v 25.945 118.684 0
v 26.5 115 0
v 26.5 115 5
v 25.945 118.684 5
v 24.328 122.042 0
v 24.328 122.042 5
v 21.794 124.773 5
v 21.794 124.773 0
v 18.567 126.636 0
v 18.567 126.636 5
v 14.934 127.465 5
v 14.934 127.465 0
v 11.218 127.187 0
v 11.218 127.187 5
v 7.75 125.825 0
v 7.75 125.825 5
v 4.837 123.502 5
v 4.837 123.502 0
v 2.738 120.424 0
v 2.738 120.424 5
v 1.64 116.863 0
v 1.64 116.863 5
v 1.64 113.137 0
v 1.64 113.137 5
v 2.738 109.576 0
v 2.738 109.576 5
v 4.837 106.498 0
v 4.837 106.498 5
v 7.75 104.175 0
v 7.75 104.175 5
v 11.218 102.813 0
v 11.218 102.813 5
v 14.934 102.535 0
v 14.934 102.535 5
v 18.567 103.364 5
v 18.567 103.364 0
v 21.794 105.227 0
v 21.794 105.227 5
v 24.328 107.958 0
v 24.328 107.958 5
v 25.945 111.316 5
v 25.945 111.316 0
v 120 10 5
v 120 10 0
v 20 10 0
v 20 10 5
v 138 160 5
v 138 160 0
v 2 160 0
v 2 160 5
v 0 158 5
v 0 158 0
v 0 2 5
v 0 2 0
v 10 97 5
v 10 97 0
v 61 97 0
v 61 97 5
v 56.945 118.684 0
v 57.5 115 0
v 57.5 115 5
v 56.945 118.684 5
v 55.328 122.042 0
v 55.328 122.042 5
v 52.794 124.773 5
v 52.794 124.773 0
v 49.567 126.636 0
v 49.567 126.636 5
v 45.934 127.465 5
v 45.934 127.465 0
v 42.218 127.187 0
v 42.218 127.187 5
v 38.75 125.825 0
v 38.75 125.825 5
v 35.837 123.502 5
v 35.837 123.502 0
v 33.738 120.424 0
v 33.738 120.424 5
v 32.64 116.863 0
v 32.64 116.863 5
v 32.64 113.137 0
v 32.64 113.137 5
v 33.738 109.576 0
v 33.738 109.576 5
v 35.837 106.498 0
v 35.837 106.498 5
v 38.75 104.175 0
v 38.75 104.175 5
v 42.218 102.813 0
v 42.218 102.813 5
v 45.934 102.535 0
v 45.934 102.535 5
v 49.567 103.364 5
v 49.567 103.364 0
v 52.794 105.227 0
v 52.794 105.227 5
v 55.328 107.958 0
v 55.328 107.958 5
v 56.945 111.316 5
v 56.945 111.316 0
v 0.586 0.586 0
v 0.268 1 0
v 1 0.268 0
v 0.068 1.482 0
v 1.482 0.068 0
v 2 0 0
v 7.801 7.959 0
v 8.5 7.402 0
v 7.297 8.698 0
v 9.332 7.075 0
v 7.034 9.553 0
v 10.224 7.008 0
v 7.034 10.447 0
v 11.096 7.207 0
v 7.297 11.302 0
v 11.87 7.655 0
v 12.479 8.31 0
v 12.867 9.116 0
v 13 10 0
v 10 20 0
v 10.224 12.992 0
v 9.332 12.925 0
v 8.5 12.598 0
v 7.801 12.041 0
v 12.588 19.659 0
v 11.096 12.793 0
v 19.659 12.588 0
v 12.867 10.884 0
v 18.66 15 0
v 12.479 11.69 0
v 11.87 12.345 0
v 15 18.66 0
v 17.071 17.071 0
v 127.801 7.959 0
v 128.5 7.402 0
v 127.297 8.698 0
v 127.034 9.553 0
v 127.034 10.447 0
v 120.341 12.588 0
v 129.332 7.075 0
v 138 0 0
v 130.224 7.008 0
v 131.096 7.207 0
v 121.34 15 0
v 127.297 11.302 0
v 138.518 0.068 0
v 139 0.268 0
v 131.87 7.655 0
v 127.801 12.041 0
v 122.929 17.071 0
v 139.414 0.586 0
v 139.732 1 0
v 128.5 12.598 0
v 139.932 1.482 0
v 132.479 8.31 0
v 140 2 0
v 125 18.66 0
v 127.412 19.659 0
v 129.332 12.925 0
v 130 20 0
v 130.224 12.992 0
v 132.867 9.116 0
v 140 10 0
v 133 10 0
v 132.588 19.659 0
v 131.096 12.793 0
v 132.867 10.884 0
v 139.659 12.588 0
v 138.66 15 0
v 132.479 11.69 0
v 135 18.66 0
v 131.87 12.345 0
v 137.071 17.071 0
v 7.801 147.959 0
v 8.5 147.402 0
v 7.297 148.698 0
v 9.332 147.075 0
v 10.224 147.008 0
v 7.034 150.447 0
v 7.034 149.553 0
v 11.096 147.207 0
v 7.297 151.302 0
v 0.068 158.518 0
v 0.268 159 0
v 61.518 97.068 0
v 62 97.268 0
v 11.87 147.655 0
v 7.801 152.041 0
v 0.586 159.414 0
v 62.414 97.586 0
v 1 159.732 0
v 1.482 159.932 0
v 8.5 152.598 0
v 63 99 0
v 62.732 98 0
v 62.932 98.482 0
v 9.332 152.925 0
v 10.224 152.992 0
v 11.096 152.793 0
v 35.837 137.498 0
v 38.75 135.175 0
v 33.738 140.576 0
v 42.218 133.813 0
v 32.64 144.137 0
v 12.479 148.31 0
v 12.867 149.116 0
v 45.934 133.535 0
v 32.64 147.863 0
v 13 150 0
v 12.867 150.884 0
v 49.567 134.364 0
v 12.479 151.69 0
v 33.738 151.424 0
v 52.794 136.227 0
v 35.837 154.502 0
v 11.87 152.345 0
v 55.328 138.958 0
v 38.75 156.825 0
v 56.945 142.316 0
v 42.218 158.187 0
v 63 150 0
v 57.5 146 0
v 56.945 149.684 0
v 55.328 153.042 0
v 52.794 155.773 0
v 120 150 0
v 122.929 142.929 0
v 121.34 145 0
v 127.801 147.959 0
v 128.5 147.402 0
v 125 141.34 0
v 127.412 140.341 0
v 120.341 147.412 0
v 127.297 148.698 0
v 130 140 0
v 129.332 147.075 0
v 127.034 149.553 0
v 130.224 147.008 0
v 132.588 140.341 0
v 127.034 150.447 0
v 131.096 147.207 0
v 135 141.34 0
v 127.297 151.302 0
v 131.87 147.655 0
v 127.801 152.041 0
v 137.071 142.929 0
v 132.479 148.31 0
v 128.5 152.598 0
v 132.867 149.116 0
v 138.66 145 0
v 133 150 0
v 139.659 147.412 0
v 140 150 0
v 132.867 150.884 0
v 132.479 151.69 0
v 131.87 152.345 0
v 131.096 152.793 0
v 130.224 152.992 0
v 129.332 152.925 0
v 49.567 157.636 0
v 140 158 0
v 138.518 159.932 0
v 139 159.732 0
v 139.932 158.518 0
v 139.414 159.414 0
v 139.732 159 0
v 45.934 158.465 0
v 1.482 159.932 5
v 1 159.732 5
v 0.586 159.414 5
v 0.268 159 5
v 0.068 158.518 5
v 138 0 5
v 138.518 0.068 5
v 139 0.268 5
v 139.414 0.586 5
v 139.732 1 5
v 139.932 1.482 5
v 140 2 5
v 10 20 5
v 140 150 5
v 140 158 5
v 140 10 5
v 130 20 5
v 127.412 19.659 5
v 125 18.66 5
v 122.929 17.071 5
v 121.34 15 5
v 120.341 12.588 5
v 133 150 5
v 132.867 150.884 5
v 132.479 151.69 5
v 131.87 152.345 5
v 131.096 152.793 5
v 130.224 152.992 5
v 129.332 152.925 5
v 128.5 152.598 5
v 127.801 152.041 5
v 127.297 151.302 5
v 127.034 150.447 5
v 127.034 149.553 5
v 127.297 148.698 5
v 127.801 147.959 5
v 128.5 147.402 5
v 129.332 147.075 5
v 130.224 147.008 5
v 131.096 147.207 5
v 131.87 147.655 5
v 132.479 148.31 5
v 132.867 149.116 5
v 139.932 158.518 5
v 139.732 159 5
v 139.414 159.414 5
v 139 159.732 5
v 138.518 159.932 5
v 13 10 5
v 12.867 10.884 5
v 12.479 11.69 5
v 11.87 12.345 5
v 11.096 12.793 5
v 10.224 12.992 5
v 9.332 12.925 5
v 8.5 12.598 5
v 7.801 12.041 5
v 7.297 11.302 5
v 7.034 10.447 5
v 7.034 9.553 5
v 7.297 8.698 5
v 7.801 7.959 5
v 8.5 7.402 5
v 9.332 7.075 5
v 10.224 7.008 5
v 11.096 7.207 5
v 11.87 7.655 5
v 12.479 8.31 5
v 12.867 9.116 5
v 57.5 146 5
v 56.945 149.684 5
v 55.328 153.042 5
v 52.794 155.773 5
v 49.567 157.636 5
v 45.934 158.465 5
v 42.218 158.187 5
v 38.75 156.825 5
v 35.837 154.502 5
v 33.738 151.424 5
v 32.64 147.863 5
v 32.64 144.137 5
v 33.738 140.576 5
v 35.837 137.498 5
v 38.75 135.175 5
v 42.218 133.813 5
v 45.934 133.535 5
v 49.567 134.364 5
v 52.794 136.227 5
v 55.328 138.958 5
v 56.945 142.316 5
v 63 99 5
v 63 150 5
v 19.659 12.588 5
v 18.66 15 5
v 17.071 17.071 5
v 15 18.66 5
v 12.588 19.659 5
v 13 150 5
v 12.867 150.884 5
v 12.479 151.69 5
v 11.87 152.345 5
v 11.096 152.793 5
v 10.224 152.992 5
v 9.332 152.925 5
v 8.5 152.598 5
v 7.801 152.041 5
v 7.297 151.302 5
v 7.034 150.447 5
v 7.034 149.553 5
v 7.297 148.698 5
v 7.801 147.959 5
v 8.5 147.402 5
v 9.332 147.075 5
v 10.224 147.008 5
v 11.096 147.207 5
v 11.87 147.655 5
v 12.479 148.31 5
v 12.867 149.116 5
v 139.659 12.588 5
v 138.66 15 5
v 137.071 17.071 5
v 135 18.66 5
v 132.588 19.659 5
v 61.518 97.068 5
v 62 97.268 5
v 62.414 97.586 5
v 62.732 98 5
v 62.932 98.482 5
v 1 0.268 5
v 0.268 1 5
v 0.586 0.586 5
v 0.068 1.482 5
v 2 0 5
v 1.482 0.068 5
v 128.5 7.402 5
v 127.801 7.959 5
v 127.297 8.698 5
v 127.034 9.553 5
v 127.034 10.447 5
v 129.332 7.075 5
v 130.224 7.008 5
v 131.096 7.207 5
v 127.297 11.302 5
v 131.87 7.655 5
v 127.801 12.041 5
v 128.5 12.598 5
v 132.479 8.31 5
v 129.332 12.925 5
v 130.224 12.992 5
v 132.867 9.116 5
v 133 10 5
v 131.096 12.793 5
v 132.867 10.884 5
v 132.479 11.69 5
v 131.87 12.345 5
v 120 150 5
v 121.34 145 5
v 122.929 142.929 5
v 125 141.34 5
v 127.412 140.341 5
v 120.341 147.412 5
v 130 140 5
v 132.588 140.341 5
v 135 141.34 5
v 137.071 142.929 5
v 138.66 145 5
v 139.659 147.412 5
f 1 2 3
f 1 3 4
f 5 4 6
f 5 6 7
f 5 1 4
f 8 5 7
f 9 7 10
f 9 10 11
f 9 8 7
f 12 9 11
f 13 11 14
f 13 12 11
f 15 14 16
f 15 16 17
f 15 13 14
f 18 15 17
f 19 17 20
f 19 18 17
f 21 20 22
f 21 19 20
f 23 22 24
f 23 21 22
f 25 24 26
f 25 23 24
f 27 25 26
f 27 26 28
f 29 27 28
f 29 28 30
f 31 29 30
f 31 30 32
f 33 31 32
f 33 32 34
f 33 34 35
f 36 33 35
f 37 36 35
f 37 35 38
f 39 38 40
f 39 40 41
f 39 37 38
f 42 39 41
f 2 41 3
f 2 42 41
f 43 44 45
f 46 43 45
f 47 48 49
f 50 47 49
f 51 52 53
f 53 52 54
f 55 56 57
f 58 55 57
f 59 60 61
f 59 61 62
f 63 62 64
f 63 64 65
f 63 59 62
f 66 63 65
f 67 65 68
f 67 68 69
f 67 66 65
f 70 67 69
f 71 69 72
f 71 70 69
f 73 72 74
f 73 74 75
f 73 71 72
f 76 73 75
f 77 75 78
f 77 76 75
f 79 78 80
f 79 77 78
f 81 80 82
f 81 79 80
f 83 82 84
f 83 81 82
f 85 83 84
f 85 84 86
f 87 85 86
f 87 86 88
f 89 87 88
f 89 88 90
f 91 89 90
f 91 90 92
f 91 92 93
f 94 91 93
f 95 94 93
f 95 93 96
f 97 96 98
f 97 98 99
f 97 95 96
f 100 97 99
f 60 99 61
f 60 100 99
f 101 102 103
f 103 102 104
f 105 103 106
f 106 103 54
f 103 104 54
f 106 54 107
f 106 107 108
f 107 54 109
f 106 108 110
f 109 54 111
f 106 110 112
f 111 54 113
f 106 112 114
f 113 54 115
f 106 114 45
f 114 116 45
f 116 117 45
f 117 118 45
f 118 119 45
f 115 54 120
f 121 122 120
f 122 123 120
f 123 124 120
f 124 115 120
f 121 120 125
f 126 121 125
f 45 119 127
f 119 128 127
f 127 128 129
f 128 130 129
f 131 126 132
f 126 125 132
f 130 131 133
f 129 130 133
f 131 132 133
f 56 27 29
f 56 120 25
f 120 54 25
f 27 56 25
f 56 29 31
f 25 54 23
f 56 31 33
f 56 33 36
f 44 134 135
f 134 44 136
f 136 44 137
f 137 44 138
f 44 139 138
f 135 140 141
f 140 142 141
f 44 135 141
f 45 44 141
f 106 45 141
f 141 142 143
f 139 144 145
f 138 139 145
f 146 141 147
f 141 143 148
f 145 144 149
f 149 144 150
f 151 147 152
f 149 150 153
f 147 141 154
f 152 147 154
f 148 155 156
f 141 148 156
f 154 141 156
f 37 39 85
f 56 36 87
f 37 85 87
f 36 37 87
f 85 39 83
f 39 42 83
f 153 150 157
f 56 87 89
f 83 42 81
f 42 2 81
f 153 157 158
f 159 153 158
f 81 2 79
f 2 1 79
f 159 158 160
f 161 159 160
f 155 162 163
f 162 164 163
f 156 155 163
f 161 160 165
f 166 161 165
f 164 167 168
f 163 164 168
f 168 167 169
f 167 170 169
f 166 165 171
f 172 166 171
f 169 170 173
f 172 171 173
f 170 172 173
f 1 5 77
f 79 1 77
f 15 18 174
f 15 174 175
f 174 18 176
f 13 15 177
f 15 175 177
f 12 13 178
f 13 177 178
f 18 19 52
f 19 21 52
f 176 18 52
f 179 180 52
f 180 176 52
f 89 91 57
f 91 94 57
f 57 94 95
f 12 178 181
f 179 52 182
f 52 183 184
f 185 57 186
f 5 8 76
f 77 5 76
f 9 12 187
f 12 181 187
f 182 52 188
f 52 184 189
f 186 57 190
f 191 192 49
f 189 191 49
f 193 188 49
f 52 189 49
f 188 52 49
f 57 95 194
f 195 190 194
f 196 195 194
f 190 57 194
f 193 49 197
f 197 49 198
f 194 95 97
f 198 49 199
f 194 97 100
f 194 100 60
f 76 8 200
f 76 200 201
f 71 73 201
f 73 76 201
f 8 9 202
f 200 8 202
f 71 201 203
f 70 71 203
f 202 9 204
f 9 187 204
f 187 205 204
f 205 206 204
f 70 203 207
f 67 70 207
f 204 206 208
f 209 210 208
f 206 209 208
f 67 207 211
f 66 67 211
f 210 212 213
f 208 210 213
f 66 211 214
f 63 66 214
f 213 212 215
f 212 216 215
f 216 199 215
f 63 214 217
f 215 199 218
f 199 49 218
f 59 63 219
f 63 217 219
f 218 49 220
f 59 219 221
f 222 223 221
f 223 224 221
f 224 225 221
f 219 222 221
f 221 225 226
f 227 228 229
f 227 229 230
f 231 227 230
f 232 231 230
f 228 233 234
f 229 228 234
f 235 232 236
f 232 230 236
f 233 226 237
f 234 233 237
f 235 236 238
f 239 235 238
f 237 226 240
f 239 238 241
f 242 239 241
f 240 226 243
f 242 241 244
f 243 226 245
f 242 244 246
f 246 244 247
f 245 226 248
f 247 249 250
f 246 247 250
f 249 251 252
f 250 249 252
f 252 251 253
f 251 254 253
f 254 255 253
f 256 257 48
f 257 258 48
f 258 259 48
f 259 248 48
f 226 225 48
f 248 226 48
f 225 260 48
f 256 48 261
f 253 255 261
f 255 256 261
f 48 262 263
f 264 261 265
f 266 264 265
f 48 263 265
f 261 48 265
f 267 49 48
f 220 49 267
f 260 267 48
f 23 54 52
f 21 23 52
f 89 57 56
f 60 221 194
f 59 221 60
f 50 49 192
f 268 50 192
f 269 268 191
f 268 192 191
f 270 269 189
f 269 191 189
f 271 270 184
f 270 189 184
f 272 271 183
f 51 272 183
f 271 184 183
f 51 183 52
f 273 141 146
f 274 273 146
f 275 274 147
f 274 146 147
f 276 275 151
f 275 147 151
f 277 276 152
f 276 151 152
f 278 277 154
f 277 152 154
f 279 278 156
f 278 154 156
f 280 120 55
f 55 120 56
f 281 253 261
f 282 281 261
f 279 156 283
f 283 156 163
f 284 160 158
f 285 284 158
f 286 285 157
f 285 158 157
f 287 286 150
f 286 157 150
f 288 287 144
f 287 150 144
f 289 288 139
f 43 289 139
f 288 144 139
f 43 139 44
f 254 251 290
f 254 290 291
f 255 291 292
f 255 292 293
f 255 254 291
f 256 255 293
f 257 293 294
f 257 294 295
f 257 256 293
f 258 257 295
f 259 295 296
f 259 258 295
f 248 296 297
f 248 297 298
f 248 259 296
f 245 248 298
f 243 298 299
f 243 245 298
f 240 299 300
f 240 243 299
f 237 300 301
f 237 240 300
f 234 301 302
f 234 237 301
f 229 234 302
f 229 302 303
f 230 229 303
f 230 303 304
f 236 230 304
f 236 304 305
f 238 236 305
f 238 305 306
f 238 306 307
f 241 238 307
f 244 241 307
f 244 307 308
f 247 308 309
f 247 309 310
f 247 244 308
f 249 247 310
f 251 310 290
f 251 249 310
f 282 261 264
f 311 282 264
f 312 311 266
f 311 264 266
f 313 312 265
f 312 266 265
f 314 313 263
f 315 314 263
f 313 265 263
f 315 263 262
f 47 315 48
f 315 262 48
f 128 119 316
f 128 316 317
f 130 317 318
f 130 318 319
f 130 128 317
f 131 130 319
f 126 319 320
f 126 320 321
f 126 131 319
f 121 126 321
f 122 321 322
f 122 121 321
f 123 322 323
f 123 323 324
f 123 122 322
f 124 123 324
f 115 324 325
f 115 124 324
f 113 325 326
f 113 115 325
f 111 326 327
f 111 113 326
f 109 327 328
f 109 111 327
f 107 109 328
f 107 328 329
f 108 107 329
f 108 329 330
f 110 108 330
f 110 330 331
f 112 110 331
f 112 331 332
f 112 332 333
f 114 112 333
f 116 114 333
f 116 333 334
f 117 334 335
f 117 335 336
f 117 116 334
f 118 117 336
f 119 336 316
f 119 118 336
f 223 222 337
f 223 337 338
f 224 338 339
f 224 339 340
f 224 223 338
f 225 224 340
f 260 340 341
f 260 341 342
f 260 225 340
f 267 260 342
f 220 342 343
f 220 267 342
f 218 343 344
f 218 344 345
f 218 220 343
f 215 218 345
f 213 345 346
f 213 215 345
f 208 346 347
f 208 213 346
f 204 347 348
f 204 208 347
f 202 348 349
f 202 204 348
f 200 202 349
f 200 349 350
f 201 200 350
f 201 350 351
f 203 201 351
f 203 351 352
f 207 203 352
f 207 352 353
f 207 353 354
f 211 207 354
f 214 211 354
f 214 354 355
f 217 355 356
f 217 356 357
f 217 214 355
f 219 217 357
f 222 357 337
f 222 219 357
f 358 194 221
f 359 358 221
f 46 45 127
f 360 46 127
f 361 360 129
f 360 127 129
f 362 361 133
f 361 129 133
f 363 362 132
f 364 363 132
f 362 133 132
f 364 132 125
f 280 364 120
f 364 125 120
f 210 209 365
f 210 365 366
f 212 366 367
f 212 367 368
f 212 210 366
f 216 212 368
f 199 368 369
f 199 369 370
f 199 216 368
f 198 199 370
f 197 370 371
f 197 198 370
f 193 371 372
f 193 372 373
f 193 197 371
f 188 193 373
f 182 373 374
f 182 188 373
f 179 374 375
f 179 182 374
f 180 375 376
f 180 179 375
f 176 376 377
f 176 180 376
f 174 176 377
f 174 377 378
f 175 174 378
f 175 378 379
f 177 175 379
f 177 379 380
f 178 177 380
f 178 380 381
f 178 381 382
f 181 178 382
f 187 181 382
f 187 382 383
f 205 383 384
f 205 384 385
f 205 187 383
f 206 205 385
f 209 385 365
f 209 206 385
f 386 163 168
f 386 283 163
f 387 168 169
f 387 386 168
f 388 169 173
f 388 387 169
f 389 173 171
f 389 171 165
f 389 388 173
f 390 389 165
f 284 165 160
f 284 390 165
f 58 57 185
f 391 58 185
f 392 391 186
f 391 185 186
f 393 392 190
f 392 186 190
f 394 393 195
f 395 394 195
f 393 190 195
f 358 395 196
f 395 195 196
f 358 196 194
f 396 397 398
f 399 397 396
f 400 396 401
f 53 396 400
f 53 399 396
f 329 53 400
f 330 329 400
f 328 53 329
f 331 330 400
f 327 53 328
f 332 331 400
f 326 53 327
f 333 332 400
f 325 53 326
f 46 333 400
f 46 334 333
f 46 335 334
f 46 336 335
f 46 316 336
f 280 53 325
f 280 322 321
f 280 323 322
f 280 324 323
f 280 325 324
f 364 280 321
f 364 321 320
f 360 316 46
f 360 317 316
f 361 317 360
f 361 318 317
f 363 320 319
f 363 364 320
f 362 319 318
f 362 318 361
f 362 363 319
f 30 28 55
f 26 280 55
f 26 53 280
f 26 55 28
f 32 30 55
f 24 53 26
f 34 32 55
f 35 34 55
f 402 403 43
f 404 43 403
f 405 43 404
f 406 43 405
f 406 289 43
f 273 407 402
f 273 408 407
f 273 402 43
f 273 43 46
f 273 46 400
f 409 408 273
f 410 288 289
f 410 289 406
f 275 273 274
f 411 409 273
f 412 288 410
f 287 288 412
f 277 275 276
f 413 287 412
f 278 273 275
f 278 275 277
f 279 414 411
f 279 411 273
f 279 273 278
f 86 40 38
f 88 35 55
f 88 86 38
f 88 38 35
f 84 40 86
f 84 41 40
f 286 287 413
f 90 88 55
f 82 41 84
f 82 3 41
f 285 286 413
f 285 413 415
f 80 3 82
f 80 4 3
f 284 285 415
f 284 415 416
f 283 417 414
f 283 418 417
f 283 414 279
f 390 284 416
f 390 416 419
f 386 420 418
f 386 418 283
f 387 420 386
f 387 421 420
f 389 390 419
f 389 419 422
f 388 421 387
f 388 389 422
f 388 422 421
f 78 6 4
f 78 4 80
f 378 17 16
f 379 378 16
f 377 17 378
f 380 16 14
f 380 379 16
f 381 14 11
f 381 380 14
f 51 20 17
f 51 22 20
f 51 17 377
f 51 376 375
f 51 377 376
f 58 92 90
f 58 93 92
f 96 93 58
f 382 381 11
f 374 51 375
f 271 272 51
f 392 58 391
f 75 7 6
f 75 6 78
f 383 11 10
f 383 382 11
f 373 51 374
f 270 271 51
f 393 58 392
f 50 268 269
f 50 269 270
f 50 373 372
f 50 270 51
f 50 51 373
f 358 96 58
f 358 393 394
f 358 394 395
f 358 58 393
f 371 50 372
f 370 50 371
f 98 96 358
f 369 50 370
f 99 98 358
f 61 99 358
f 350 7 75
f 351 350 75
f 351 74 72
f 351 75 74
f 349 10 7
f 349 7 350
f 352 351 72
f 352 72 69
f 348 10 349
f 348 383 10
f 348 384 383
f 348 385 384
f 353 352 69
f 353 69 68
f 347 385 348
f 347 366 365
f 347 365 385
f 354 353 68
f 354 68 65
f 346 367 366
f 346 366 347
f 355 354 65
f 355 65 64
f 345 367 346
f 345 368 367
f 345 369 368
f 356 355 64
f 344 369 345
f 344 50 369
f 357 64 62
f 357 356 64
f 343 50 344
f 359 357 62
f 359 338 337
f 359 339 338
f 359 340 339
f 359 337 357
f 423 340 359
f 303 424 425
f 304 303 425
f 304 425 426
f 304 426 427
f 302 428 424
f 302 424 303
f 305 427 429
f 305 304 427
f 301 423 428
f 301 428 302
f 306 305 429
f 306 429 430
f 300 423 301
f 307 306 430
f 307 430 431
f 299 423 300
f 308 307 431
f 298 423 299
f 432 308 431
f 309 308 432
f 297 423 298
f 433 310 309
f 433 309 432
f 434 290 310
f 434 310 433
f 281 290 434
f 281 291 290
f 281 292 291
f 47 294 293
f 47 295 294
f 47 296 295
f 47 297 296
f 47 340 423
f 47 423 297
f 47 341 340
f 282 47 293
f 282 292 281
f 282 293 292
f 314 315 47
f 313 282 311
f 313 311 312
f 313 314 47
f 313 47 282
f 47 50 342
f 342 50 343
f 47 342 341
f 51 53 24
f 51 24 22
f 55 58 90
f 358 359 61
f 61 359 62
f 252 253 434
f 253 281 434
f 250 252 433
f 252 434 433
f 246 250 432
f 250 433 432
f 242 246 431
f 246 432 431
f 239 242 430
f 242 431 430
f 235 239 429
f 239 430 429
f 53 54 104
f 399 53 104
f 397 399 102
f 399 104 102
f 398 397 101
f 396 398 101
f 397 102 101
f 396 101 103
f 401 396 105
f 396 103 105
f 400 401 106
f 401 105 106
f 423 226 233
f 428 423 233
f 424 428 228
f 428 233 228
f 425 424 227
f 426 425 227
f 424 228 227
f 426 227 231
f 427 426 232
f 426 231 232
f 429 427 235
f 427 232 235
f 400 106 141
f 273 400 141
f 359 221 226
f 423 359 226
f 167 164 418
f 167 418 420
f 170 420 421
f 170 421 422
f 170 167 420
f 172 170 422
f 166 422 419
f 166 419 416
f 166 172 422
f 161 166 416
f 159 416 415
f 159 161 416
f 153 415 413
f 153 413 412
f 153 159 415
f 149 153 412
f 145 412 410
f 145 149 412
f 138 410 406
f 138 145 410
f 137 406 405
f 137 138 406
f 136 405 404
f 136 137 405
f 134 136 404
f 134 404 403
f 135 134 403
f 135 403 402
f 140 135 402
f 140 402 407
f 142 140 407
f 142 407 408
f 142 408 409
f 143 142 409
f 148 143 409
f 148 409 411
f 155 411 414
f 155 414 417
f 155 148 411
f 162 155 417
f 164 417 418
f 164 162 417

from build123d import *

# Parameters (mm, degrees)
MODEL_R             = 12.5
MODEL_R_2           = 3
BOSS_EXTRUDE2_DEPTH = 5
FILLET1_R           = 10
FILLET2_R           = 10


with BuildPart() as part:
    # Model → Boss-Extrude2 (new body)
    with BuildSketch(Plane.XY):
        with BuildLine():
            Line((140, 140), (140, 158))
            ThreePointArc((140, 158), (139.414213562, 159.414213562), (138, 160))
            Line((138, 160), (2, 160))
            ThreePointArc((2, 160), (0.585786438, 159.414213562), (0, 158))
            Line((0, 158), (0, 2))
            ThreePointArc((0, 2), (0.585786438, 0.585786438), (2, 0))
            Line((2, 0), (138, 0))
            ThreePointArc((138, 0), (139.414213562, 0.585786438), (140, 2))
            Line((140, 2), (140, 20))
            Line((140, 20), (130, 20))
            ThreePointArc((130, 20), (122.928932188, 17.071067812), (120, 10))
            Line((120, 10), (20, 10))
            ThreePointArc((20, 10), (17.071067812, 17.071067812), (10, 20))
            Line((10, 20), (10, 97))
            Line((10, 97), (61, 97))
            ThreePointArc((61, 97), (62.414213562, 97.585786438), (63, 99))
            Line((63, 99), (63, 150))
            Line((63, 150), (120, 150))
            ThreePointArc((120, 150), (122.928932188, 142.928932188), (130, 140))
            Line((130, 140), (140, 140))
        make_face()
        with Locations((14, 115)):
            Circle(MODEL_R, mode=Mode.SUBTRACT)
        with Locations((45, 115)):
            Circle(MODEL_R, mode=Mode.SUBTRACT)
        with Locations((45, 146)):
            Circle(MODEL_R, mode=Mode.SUBTRACT)
        with Locations((10, 10)):
            Circle(MODEL_R_2, mode=Mode.SUBTRACT)
        with Locations((130, 10)):
            Circle(MODEL_R_2, mode=Mode.SUBTRACT)
        with Locations((130, 150)):
            Circle(MODEL_R_2, mode=Mode.SUBTRACT)
        with Locations((10, 150)):
            Circle(MODEL_R_2, mode=Mode.SUBTRACT)
    extrude(amount=BOSS_EXTRUDE2_DEPTH)

    # Fillet1
    fillet1_edges = [part.edges().sort_by_distance(p)[0] for p in [
        (140, 20, 2.5),
    ]]
    fillet(fillet1_edges, radius=FILLET1_R - 0.0001)  # a hair under: the kernel refuses the full size

    # Fillet2
    fillet2_edges = [part.edges().sort_by_distance(p)[0] for p in [
        (140, 140, 2.5),
    ]]
    fillet(fillet2_edges, radius=FILLET2_R - 0.0001)  # a hair under: the kernel refuses the full size


solid = part.part
